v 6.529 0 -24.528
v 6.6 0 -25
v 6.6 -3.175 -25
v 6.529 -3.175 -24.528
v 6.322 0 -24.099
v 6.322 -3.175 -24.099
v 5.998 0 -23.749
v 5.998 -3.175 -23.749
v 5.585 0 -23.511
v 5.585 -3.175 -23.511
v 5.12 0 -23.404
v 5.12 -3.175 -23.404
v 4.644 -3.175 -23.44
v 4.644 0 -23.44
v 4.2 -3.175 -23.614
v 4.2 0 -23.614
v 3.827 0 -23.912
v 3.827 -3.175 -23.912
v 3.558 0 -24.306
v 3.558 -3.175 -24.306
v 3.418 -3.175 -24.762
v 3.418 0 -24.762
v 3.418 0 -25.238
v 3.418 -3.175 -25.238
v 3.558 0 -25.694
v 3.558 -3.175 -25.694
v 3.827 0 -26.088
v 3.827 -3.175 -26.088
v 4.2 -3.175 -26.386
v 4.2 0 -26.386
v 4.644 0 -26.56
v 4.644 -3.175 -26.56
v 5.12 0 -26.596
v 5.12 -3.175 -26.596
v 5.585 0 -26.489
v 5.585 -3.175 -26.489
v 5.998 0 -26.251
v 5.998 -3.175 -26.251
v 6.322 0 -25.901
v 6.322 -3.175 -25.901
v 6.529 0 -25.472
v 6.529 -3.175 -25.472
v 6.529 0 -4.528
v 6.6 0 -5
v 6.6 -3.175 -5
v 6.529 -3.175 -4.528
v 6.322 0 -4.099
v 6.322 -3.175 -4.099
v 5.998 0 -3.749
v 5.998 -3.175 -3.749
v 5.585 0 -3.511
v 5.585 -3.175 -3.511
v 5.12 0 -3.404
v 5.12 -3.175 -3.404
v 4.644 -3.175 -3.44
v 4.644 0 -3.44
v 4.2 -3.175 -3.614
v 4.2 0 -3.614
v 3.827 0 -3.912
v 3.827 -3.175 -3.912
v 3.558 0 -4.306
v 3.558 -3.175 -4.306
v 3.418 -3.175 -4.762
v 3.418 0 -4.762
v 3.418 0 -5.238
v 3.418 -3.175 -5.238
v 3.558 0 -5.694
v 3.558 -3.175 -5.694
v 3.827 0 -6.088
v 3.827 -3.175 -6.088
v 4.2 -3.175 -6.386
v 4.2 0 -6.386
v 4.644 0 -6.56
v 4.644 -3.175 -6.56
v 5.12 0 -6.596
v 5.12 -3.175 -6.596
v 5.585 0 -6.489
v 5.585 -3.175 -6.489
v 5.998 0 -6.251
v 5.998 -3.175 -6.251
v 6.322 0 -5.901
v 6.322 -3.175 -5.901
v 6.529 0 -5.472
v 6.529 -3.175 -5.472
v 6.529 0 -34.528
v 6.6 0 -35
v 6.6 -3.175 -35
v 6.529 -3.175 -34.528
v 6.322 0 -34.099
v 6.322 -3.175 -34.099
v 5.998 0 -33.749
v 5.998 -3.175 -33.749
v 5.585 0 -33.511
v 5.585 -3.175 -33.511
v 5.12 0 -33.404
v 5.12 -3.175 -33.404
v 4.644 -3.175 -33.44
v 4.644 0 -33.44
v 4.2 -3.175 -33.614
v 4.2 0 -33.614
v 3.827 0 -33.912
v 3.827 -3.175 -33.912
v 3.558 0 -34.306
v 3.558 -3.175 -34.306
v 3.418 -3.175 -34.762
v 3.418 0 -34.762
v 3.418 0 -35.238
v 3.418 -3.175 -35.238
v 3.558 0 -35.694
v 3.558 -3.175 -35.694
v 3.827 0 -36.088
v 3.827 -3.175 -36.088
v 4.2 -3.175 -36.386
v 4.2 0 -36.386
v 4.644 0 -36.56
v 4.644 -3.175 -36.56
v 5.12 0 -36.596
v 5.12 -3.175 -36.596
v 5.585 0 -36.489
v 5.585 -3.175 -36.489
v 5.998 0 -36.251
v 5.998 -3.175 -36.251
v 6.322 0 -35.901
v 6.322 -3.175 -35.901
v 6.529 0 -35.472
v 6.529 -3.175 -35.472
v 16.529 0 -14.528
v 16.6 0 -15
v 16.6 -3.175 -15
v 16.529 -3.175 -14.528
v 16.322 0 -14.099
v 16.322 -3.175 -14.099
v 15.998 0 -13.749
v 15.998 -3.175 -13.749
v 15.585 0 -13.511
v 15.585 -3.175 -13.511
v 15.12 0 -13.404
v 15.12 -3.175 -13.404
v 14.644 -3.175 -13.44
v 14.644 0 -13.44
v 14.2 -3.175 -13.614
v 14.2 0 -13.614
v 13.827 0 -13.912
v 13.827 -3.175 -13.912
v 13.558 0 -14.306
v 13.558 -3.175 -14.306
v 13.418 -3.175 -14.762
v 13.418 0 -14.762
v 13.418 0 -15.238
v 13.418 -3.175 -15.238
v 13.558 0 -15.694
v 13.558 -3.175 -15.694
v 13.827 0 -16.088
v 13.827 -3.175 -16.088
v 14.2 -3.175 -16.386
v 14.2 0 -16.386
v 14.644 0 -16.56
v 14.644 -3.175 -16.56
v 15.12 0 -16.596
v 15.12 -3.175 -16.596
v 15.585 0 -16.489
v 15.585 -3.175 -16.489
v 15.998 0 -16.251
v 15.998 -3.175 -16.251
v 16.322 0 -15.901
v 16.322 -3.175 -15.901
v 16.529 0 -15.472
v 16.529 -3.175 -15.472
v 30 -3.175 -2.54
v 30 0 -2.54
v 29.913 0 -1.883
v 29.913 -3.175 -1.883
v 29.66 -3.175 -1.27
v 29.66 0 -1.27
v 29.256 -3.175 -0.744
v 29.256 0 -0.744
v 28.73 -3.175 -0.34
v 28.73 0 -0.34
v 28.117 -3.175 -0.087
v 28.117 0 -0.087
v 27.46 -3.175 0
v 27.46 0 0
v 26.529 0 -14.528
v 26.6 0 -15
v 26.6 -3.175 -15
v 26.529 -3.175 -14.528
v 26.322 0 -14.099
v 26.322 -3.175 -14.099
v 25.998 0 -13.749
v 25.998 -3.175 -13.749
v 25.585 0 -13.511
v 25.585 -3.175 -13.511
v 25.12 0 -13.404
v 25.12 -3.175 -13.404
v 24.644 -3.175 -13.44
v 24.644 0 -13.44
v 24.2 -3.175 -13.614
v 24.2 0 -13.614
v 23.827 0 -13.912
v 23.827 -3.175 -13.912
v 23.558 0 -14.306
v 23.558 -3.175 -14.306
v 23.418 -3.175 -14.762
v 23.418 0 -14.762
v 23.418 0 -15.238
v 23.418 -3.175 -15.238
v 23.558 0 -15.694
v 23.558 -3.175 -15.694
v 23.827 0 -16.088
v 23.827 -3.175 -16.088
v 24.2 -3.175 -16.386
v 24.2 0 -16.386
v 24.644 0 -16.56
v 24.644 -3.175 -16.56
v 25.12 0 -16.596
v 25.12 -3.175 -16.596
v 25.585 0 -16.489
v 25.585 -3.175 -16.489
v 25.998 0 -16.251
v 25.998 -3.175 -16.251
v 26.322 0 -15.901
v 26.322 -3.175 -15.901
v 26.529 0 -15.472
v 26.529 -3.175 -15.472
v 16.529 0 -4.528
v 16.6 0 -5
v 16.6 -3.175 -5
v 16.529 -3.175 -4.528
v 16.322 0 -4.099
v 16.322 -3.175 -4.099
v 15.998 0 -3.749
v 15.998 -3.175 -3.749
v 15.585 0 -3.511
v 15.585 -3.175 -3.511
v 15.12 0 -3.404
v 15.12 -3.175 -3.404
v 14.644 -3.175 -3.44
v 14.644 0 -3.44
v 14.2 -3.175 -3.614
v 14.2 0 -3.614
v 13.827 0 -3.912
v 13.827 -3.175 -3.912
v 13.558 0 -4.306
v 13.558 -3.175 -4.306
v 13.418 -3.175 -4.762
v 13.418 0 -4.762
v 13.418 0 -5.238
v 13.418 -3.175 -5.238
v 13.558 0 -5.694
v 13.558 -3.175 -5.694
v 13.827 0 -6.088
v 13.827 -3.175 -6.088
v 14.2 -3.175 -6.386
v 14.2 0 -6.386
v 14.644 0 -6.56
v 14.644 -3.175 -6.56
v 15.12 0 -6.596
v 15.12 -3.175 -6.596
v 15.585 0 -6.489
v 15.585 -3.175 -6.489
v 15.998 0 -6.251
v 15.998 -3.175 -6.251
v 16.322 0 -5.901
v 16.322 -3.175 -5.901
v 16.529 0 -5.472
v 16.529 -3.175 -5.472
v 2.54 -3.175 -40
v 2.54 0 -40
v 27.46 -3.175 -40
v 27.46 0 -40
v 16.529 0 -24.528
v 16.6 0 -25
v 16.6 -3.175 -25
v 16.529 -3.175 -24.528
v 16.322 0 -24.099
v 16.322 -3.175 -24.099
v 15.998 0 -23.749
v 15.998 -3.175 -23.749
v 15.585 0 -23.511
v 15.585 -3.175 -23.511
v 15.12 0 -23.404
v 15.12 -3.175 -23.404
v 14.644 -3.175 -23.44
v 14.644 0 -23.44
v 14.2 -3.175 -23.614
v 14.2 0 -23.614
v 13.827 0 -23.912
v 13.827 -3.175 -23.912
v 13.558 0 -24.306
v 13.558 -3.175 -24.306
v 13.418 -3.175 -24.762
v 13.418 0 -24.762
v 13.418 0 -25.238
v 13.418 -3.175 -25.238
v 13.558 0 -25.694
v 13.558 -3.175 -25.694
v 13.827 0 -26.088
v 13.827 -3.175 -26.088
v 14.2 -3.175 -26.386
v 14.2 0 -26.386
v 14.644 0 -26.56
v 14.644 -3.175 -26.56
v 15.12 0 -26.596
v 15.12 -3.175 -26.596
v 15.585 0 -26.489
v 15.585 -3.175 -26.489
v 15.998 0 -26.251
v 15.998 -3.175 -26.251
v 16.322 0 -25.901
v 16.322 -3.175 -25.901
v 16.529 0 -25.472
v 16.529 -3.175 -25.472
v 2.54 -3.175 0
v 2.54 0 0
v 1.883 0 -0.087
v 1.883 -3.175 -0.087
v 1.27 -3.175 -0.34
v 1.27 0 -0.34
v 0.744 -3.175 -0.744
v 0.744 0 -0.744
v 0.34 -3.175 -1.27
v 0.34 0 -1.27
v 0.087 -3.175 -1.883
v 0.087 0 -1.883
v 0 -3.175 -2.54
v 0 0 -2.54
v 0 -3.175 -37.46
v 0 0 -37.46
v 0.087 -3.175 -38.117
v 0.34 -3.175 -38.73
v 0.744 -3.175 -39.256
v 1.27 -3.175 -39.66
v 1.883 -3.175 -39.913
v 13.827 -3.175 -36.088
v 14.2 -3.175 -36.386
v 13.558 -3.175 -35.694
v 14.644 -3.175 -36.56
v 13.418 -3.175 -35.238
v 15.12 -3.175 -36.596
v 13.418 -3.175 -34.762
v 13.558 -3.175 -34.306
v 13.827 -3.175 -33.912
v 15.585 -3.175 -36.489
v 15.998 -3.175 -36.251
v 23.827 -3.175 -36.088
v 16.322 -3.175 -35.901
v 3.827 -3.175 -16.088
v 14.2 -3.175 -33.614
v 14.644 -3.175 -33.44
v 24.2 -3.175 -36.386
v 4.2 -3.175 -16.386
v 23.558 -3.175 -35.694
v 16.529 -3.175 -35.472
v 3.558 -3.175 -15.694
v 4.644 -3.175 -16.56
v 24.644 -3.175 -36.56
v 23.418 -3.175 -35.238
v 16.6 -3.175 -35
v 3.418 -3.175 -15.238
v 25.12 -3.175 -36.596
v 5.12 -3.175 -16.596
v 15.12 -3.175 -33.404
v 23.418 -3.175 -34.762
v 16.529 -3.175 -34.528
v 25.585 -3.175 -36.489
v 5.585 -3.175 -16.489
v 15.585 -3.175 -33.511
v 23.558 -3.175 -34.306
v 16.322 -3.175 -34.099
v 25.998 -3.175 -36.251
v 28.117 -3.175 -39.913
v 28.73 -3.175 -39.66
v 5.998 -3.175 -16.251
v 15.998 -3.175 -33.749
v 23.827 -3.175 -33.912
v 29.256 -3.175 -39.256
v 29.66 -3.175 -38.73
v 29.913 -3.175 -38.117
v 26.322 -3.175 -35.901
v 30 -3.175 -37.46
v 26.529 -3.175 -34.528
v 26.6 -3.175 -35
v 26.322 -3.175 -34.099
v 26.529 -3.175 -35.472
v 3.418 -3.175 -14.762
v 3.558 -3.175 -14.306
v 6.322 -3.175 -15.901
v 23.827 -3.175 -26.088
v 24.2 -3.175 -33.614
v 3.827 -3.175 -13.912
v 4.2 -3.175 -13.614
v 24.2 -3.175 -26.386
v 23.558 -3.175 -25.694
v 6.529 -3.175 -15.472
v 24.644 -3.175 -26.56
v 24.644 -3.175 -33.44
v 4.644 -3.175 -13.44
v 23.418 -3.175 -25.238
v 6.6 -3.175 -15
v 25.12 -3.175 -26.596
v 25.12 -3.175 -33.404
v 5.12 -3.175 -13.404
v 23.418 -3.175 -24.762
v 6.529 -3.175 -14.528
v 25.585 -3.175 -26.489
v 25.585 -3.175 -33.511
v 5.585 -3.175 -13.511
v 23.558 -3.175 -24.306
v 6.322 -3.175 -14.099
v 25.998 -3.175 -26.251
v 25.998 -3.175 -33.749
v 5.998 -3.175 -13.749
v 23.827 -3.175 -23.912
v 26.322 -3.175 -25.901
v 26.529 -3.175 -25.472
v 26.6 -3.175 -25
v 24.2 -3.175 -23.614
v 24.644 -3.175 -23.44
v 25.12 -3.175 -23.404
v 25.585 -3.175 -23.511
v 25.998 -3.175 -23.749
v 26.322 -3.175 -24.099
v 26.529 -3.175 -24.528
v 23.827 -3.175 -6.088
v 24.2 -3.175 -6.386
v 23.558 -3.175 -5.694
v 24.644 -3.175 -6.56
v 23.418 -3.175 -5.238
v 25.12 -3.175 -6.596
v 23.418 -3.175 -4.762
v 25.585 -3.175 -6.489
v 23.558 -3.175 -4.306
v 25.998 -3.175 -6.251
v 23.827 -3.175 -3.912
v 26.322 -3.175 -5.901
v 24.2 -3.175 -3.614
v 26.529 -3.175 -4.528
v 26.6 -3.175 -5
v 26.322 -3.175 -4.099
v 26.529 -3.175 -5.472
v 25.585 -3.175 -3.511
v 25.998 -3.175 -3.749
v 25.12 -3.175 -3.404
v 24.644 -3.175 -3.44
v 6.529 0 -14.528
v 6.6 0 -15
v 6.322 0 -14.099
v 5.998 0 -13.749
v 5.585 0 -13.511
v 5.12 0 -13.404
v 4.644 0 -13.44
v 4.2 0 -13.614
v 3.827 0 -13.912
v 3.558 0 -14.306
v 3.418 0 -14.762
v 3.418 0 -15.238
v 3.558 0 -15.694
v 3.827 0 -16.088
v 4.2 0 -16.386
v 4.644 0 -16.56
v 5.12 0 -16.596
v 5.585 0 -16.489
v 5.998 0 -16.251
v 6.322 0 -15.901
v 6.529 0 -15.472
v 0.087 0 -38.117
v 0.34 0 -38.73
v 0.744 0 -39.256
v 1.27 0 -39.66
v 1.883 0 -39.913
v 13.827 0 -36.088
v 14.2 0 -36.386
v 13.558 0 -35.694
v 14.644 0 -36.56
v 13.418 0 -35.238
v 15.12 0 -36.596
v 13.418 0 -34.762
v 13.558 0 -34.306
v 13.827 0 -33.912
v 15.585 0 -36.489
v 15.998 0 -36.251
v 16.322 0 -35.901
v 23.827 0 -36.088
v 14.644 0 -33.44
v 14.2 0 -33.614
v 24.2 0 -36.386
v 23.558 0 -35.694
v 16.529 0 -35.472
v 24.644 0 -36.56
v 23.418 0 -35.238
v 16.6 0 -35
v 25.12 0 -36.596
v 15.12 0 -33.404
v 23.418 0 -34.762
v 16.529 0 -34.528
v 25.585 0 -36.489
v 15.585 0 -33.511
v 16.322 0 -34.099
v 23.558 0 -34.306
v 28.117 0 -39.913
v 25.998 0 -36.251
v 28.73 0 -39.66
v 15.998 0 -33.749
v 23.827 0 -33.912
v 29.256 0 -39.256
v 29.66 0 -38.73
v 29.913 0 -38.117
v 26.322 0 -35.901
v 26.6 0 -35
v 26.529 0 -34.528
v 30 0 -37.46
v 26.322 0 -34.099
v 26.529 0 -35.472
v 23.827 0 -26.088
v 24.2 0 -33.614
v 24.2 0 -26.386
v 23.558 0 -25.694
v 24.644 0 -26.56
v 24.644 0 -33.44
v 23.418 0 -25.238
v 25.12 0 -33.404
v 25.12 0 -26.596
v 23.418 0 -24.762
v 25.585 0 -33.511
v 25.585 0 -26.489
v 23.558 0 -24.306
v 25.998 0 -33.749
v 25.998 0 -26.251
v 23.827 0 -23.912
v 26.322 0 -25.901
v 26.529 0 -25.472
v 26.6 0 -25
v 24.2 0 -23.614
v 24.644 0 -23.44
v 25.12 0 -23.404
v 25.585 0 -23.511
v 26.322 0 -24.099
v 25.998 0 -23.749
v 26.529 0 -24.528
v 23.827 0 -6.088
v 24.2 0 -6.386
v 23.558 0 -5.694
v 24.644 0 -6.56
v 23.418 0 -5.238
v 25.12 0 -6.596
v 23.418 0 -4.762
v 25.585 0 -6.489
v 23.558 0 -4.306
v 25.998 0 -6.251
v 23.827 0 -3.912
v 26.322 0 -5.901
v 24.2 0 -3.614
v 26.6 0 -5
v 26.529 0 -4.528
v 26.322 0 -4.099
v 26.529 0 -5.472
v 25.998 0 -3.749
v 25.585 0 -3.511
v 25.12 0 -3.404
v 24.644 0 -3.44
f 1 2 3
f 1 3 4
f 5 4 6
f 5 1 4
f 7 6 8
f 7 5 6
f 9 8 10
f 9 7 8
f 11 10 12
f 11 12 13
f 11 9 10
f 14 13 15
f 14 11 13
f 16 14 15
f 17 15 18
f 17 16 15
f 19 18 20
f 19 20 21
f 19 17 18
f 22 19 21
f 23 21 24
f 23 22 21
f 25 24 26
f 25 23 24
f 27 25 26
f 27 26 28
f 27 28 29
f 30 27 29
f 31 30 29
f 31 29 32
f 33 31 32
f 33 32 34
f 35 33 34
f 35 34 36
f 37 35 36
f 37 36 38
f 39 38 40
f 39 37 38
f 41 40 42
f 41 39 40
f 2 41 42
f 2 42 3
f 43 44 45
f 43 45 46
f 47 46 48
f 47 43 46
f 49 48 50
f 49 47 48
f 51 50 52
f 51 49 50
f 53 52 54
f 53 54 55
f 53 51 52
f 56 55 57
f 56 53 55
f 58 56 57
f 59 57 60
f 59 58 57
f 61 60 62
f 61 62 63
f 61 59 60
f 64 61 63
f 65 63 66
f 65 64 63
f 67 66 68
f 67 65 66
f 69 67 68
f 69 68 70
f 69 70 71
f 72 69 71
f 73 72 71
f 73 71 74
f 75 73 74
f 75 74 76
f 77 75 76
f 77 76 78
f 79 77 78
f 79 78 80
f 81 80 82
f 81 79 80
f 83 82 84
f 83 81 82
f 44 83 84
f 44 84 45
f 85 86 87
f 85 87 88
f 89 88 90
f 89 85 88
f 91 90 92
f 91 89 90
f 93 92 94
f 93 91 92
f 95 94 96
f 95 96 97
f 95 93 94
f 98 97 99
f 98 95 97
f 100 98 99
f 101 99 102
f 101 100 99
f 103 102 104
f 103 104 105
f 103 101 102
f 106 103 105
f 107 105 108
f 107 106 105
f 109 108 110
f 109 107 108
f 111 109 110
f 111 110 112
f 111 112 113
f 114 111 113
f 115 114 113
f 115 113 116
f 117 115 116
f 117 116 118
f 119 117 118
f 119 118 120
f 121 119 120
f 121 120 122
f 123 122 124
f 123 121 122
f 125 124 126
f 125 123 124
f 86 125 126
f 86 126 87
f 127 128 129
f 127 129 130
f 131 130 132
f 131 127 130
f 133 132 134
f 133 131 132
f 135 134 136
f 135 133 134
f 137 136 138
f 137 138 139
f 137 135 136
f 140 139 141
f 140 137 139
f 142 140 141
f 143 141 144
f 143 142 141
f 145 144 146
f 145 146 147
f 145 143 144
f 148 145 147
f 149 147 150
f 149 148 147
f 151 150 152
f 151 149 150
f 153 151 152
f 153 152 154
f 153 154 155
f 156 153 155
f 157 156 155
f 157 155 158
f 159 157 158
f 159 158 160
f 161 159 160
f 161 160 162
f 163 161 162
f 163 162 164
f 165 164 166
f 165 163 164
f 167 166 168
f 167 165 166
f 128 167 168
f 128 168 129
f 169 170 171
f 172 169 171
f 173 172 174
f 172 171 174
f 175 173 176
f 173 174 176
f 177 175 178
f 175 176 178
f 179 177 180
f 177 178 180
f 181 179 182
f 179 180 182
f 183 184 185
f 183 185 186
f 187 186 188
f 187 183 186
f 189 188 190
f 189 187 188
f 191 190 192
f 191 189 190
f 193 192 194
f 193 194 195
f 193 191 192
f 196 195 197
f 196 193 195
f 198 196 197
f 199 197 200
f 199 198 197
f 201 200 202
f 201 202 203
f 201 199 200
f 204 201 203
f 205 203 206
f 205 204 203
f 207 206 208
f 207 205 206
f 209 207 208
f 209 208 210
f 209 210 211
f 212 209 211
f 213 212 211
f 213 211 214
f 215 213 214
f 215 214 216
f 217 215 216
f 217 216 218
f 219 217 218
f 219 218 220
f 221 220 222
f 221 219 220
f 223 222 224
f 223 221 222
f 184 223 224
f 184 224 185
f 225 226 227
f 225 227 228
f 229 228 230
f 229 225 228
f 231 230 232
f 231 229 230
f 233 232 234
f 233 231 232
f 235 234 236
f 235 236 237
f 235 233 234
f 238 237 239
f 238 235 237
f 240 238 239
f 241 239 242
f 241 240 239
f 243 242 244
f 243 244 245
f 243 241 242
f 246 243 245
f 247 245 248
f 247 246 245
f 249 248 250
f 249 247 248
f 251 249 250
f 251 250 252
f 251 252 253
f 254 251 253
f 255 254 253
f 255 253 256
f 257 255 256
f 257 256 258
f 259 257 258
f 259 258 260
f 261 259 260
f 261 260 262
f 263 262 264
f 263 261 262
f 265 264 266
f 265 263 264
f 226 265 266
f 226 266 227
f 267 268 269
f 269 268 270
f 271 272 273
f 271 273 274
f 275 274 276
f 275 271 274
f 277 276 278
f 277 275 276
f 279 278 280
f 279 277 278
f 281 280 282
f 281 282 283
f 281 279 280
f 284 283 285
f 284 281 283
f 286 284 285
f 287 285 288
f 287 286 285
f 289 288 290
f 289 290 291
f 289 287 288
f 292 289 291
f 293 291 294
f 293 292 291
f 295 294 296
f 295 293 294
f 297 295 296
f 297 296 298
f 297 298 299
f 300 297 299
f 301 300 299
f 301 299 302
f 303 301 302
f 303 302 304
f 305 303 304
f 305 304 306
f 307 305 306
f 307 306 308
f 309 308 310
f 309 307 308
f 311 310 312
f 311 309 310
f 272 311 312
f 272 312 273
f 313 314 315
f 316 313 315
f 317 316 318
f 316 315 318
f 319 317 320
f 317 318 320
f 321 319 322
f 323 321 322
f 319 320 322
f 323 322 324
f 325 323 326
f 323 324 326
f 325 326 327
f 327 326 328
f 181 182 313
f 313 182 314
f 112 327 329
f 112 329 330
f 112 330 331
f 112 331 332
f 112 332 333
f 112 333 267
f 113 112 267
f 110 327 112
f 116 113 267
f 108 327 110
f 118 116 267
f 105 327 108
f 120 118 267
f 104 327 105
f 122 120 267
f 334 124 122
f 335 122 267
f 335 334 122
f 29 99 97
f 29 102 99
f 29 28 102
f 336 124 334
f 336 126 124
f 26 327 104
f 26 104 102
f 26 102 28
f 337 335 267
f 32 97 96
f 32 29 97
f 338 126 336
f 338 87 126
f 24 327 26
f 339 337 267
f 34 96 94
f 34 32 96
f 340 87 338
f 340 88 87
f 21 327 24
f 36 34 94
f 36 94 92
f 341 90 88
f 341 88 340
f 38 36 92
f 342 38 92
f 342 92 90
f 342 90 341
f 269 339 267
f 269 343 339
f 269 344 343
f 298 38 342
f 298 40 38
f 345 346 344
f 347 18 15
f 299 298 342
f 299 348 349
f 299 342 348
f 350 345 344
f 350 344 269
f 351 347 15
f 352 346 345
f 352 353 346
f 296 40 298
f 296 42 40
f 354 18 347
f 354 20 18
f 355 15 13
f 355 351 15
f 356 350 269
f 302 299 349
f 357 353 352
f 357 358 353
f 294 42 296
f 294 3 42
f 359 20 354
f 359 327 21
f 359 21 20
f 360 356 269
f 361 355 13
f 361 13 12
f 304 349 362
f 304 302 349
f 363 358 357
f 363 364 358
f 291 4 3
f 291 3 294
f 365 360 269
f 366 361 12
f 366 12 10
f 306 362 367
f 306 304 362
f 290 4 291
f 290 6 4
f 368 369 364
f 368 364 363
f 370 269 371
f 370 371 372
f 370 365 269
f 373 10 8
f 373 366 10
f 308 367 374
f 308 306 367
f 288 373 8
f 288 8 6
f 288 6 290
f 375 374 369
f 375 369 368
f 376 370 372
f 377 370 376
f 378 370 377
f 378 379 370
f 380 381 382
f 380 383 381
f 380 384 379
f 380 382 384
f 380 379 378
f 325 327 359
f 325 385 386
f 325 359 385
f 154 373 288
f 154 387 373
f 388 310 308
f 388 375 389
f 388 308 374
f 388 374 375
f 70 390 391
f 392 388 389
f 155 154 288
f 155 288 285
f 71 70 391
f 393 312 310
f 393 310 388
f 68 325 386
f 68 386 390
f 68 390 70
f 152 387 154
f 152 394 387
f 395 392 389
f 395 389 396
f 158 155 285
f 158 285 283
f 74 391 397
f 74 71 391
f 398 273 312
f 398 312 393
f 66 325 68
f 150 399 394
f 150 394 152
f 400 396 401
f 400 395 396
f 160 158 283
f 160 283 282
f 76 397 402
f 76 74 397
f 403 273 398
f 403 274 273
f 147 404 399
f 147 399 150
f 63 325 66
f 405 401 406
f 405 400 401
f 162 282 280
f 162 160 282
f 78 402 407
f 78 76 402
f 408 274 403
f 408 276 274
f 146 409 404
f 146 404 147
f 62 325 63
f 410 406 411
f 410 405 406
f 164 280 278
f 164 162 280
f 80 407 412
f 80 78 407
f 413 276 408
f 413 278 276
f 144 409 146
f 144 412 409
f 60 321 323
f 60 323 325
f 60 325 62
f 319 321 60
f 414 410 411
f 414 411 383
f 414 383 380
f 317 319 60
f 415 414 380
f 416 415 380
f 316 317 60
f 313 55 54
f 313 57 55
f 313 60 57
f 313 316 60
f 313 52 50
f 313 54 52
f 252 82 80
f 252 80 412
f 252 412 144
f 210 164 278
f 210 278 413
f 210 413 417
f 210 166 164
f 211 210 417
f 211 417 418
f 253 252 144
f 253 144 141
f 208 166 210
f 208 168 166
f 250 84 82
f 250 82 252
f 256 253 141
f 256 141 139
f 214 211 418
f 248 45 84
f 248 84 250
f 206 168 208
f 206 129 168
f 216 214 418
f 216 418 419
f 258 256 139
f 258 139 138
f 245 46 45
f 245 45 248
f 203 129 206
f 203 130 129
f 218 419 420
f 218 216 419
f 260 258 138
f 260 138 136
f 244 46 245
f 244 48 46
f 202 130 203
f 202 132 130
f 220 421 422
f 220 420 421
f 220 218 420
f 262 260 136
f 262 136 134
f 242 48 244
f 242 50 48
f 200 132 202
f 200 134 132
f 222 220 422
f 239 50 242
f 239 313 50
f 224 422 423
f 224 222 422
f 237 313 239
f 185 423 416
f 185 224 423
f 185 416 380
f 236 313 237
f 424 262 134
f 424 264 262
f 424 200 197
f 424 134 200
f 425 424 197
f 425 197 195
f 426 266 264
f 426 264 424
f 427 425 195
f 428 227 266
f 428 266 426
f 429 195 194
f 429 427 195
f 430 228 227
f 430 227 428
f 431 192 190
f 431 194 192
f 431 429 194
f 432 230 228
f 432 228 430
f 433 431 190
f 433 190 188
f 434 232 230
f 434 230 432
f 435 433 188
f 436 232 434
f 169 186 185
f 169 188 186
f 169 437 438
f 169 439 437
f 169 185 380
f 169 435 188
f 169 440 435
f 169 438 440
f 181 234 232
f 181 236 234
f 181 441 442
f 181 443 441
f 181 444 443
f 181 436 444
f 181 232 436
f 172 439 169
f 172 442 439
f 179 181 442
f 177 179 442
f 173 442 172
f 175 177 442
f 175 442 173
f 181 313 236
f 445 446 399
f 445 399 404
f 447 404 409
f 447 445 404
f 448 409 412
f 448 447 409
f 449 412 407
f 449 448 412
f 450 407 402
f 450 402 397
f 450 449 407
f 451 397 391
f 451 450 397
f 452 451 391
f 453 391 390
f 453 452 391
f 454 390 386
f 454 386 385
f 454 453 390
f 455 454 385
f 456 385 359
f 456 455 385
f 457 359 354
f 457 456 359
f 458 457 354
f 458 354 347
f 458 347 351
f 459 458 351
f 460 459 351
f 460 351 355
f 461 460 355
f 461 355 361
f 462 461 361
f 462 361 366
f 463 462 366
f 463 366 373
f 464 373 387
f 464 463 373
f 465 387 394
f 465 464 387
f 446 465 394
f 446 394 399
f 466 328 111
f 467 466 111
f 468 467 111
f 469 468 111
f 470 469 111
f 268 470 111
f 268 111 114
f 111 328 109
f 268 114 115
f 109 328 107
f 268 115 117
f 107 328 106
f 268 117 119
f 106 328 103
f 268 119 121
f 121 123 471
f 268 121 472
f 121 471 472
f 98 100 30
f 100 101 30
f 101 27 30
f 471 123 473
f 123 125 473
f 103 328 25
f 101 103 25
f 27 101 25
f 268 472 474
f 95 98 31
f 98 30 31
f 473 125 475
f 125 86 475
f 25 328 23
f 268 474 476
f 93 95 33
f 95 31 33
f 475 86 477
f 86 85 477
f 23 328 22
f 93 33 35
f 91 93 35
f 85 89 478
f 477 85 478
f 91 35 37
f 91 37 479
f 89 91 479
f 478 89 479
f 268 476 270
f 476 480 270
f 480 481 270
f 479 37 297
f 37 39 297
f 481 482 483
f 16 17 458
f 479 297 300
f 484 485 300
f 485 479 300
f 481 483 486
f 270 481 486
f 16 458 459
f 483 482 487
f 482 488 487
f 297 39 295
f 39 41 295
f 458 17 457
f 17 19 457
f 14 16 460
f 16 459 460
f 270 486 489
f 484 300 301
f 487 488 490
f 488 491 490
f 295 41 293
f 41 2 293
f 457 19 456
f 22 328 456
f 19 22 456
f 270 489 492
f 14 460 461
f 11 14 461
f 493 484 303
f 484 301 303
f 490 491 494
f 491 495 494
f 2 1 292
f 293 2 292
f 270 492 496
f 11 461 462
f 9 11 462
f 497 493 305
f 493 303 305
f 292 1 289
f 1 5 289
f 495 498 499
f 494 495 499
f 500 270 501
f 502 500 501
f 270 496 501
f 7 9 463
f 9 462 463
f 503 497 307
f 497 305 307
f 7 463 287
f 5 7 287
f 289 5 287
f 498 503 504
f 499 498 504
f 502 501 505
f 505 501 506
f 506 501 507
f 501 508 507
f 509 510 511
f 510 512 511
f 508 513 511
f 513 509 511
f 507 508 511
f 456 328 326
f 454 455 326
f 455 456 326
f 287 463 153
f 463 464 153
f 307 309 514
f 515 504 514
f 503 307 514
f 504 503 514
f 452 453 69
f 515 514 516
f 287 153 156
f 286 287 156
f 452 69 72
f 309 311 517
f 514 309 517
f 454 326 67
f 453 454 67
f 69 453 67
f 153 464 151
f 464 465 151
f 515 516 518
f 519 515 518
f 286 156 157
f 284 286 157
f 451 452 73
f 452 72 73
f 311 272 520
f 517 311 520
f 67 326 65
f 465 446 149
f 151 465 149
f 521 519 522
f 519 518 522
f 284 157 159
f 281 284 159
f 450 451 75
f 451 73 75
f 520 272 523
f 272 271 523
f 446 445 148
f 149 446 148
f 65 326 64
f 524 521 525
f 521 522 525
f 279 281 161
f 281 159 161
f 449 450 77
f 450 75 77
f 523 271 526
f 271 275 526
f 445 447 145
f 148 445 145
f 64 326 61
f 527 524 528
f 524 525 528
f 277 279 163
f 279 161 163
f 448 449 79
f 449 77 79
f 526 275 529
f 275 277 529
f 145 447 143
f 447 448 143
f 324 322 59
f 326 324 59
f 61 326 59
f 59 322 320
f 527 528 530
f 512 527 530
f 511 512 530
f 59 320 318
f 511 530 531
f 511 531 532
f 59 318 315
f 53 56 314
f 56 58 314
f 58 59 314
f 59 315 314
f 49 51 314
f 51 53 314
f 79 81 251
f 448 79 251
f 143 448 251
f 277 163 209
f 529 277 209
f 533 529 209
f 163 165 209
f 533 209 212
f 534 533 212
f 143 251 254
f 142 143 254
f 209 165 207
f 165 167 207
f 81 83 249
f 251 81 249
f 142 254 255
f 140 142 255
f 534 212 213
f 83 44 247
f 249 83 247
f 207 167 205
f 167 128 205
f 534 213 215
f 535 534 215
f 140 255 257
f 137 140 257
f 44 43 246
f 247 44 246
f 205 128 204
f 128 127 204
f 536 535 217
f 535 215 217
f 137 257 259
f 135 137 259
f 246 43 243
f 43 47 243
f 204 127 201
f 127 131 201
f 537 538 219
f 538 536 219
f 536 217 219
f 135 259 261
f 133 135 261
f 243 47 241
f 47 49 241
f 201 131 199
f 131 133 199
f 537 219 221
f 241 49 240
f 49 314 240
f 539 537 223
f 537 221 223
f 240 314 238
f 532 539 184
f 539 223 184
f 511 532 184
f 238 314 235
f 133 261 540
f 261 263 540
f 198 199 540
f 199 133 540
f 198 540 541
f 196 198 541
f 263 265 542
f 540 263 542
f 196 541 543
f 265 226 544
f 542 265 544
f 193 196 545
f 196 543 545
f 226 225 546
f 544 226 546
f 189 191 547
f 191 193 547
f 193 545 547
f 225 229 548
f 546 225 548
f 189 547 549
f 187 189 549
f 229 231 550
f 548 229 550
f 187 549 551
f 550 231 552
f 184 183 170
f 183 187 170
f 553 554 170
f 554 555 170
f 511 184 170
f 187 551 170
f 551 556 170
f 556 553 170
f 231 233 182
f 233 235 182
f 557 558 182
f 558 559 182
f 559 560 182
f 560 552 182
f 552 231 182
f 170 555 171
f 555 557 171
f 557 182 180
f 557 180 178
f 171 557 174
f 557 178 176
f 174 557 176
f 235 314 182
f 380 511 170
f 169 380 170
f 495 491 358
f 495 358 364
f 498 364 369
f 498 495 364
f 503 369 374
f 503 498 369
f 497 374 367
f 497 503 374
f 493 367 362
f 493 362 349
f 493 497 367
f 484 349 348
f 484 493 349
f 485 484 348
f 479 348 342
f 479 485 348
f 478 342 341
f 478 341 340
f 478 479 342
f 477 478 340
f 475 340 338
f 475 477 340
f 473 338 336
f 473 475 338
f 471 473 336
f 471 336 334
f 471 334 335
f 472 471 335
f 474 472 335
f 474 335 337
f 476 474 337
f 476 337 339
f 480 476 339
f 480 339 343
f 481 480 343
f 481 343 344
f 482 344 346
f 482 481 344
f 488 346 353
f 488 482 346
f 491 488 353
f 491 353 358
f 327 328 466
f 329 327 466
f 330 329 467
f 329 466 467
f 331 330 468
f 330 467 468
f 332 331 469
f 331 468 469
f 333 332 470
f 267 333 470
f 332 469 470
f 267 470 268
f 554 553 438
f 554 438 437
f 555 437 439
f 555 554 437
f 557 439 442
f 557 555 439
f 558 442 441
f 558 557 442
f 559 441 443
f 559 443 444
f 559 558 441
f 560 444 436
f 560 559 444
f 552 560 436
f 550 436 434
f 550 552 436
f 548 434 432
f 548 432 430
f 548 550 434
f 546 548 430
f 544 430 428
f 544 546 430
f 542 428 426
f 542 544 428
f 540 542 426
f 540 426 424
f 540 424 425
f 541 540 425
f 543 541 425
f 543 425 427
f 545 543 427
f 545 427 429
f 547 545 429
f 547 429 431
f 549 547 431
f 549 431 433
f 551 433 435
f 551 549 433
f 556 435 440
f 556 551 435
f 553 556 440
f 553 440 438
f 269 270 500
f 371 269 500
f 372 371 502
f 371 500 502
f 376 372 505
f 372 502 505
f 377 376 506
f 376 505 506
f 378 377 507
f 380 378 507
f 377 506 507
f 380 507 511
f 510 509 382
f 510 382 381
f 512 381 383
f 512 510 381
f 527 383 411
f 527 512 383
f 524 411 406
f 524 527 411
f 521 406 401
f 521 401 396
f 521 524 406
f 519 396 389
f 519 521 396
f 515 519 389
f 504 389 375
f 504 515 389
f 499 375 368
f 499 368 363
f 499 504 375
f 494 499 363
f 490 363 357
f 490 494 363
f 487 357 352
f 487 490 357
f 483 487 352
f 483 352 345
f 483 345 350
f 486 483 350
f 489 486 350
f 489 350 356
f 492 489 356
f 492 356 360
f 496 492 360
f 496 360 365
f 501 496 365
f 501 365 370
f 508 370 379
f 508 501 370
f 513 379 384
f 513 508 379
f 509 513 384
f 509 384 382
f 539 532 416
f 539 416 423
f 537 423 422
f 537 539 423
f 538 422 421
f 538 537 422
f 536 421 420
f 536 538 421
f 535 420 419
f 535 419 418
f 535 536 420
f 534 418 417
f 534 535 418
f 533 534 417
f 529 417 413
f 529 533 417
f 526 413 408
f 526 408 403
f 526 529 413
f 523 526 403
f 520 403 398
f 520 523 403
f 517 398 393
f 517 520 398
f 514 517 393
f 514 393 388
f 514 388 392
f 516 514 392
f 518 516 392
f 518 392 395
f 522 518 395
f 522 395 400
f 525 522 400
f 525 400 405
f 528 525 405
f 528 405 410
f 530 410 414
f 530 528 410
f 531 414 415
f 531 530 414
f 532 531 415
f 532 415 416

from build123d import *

# Parameters (mm, degrees)
F0_R     = 1.6
F1_DEPTH = 3.175


# Not quite as in the source:
# - a length typed as a fraction of an inch, garbled in the dataset ("3 / 203.2 mm" for 3/8 in), is restored


with BuildPart() as f1:
    # F0 (on Front) → F1 (new body)
    with BuildSketch(Plane.XZ):
        with BuildLine():
            Line((27.46, 0), (2.54, 0))
            ThreePointArc((2.54, 0), (0.7439487758, -0.7439487758), (0, -2.54))
            Line((0, -2.54), (0, -37.46))
            ThreePointArc((0, -37.46), (0.7439487758, -39.2560512242), (2.54, -40))
            Line((2.54, -40), (27.46, -40))
            ThreePointArc((27.46, -40), (29.2560512242, -39.2560512242), (30, -37.46))
            Line((30, -37.46), (30, -2.54))
            ThreePointArc((30, -2.54), (29.2560512242, -0.7439487758), (27.46, 0))
        make_face()
        with Locations((5, -35)):
            Circle(F0_R, mode=Mode.SUBTRACT)
        with Locations((5, -25)):
            Circle(F0_R, mode=Mode.SUBTRACT)
        with Locations((15, -35)):
            Circle(F0_R, mode=Mode.SUBTRACT)
        with Locations((25, -35)):
            Circle(F0_R, mode=Mode.SUBTRACT)
        with Locations((15, -25)):
            Circle(F0_R, mode=Mode.SUBTRACT)
        with Locations((25, -25)):
            Circle(F0_R, mode=Mode.SUBTRACT)
        with Locations((5, -15)):
            Circle(F0_R, mode=Mode.SUBTRACT)
        with Locations((5, -5)):
            Circle(F0_R, mode=Mode.SUBTRACT)
        with Locations((15, -15)):
            Circle(F0_R, mode=Mode.SUBTRACT)
        with Locations((25, -15)):
            Circle(F0_R, mode=Mode.SUBTRACT)
        with Locations((15, -5)):
            Circle(F0_R, mode=Mode.SUBTRACT)
        with Locations((25, -5)):
            Circle(F0_R, mode=Mode.SUBTRACT)
    extrude(amount=F1_DEPTH)


solid = f1.part
